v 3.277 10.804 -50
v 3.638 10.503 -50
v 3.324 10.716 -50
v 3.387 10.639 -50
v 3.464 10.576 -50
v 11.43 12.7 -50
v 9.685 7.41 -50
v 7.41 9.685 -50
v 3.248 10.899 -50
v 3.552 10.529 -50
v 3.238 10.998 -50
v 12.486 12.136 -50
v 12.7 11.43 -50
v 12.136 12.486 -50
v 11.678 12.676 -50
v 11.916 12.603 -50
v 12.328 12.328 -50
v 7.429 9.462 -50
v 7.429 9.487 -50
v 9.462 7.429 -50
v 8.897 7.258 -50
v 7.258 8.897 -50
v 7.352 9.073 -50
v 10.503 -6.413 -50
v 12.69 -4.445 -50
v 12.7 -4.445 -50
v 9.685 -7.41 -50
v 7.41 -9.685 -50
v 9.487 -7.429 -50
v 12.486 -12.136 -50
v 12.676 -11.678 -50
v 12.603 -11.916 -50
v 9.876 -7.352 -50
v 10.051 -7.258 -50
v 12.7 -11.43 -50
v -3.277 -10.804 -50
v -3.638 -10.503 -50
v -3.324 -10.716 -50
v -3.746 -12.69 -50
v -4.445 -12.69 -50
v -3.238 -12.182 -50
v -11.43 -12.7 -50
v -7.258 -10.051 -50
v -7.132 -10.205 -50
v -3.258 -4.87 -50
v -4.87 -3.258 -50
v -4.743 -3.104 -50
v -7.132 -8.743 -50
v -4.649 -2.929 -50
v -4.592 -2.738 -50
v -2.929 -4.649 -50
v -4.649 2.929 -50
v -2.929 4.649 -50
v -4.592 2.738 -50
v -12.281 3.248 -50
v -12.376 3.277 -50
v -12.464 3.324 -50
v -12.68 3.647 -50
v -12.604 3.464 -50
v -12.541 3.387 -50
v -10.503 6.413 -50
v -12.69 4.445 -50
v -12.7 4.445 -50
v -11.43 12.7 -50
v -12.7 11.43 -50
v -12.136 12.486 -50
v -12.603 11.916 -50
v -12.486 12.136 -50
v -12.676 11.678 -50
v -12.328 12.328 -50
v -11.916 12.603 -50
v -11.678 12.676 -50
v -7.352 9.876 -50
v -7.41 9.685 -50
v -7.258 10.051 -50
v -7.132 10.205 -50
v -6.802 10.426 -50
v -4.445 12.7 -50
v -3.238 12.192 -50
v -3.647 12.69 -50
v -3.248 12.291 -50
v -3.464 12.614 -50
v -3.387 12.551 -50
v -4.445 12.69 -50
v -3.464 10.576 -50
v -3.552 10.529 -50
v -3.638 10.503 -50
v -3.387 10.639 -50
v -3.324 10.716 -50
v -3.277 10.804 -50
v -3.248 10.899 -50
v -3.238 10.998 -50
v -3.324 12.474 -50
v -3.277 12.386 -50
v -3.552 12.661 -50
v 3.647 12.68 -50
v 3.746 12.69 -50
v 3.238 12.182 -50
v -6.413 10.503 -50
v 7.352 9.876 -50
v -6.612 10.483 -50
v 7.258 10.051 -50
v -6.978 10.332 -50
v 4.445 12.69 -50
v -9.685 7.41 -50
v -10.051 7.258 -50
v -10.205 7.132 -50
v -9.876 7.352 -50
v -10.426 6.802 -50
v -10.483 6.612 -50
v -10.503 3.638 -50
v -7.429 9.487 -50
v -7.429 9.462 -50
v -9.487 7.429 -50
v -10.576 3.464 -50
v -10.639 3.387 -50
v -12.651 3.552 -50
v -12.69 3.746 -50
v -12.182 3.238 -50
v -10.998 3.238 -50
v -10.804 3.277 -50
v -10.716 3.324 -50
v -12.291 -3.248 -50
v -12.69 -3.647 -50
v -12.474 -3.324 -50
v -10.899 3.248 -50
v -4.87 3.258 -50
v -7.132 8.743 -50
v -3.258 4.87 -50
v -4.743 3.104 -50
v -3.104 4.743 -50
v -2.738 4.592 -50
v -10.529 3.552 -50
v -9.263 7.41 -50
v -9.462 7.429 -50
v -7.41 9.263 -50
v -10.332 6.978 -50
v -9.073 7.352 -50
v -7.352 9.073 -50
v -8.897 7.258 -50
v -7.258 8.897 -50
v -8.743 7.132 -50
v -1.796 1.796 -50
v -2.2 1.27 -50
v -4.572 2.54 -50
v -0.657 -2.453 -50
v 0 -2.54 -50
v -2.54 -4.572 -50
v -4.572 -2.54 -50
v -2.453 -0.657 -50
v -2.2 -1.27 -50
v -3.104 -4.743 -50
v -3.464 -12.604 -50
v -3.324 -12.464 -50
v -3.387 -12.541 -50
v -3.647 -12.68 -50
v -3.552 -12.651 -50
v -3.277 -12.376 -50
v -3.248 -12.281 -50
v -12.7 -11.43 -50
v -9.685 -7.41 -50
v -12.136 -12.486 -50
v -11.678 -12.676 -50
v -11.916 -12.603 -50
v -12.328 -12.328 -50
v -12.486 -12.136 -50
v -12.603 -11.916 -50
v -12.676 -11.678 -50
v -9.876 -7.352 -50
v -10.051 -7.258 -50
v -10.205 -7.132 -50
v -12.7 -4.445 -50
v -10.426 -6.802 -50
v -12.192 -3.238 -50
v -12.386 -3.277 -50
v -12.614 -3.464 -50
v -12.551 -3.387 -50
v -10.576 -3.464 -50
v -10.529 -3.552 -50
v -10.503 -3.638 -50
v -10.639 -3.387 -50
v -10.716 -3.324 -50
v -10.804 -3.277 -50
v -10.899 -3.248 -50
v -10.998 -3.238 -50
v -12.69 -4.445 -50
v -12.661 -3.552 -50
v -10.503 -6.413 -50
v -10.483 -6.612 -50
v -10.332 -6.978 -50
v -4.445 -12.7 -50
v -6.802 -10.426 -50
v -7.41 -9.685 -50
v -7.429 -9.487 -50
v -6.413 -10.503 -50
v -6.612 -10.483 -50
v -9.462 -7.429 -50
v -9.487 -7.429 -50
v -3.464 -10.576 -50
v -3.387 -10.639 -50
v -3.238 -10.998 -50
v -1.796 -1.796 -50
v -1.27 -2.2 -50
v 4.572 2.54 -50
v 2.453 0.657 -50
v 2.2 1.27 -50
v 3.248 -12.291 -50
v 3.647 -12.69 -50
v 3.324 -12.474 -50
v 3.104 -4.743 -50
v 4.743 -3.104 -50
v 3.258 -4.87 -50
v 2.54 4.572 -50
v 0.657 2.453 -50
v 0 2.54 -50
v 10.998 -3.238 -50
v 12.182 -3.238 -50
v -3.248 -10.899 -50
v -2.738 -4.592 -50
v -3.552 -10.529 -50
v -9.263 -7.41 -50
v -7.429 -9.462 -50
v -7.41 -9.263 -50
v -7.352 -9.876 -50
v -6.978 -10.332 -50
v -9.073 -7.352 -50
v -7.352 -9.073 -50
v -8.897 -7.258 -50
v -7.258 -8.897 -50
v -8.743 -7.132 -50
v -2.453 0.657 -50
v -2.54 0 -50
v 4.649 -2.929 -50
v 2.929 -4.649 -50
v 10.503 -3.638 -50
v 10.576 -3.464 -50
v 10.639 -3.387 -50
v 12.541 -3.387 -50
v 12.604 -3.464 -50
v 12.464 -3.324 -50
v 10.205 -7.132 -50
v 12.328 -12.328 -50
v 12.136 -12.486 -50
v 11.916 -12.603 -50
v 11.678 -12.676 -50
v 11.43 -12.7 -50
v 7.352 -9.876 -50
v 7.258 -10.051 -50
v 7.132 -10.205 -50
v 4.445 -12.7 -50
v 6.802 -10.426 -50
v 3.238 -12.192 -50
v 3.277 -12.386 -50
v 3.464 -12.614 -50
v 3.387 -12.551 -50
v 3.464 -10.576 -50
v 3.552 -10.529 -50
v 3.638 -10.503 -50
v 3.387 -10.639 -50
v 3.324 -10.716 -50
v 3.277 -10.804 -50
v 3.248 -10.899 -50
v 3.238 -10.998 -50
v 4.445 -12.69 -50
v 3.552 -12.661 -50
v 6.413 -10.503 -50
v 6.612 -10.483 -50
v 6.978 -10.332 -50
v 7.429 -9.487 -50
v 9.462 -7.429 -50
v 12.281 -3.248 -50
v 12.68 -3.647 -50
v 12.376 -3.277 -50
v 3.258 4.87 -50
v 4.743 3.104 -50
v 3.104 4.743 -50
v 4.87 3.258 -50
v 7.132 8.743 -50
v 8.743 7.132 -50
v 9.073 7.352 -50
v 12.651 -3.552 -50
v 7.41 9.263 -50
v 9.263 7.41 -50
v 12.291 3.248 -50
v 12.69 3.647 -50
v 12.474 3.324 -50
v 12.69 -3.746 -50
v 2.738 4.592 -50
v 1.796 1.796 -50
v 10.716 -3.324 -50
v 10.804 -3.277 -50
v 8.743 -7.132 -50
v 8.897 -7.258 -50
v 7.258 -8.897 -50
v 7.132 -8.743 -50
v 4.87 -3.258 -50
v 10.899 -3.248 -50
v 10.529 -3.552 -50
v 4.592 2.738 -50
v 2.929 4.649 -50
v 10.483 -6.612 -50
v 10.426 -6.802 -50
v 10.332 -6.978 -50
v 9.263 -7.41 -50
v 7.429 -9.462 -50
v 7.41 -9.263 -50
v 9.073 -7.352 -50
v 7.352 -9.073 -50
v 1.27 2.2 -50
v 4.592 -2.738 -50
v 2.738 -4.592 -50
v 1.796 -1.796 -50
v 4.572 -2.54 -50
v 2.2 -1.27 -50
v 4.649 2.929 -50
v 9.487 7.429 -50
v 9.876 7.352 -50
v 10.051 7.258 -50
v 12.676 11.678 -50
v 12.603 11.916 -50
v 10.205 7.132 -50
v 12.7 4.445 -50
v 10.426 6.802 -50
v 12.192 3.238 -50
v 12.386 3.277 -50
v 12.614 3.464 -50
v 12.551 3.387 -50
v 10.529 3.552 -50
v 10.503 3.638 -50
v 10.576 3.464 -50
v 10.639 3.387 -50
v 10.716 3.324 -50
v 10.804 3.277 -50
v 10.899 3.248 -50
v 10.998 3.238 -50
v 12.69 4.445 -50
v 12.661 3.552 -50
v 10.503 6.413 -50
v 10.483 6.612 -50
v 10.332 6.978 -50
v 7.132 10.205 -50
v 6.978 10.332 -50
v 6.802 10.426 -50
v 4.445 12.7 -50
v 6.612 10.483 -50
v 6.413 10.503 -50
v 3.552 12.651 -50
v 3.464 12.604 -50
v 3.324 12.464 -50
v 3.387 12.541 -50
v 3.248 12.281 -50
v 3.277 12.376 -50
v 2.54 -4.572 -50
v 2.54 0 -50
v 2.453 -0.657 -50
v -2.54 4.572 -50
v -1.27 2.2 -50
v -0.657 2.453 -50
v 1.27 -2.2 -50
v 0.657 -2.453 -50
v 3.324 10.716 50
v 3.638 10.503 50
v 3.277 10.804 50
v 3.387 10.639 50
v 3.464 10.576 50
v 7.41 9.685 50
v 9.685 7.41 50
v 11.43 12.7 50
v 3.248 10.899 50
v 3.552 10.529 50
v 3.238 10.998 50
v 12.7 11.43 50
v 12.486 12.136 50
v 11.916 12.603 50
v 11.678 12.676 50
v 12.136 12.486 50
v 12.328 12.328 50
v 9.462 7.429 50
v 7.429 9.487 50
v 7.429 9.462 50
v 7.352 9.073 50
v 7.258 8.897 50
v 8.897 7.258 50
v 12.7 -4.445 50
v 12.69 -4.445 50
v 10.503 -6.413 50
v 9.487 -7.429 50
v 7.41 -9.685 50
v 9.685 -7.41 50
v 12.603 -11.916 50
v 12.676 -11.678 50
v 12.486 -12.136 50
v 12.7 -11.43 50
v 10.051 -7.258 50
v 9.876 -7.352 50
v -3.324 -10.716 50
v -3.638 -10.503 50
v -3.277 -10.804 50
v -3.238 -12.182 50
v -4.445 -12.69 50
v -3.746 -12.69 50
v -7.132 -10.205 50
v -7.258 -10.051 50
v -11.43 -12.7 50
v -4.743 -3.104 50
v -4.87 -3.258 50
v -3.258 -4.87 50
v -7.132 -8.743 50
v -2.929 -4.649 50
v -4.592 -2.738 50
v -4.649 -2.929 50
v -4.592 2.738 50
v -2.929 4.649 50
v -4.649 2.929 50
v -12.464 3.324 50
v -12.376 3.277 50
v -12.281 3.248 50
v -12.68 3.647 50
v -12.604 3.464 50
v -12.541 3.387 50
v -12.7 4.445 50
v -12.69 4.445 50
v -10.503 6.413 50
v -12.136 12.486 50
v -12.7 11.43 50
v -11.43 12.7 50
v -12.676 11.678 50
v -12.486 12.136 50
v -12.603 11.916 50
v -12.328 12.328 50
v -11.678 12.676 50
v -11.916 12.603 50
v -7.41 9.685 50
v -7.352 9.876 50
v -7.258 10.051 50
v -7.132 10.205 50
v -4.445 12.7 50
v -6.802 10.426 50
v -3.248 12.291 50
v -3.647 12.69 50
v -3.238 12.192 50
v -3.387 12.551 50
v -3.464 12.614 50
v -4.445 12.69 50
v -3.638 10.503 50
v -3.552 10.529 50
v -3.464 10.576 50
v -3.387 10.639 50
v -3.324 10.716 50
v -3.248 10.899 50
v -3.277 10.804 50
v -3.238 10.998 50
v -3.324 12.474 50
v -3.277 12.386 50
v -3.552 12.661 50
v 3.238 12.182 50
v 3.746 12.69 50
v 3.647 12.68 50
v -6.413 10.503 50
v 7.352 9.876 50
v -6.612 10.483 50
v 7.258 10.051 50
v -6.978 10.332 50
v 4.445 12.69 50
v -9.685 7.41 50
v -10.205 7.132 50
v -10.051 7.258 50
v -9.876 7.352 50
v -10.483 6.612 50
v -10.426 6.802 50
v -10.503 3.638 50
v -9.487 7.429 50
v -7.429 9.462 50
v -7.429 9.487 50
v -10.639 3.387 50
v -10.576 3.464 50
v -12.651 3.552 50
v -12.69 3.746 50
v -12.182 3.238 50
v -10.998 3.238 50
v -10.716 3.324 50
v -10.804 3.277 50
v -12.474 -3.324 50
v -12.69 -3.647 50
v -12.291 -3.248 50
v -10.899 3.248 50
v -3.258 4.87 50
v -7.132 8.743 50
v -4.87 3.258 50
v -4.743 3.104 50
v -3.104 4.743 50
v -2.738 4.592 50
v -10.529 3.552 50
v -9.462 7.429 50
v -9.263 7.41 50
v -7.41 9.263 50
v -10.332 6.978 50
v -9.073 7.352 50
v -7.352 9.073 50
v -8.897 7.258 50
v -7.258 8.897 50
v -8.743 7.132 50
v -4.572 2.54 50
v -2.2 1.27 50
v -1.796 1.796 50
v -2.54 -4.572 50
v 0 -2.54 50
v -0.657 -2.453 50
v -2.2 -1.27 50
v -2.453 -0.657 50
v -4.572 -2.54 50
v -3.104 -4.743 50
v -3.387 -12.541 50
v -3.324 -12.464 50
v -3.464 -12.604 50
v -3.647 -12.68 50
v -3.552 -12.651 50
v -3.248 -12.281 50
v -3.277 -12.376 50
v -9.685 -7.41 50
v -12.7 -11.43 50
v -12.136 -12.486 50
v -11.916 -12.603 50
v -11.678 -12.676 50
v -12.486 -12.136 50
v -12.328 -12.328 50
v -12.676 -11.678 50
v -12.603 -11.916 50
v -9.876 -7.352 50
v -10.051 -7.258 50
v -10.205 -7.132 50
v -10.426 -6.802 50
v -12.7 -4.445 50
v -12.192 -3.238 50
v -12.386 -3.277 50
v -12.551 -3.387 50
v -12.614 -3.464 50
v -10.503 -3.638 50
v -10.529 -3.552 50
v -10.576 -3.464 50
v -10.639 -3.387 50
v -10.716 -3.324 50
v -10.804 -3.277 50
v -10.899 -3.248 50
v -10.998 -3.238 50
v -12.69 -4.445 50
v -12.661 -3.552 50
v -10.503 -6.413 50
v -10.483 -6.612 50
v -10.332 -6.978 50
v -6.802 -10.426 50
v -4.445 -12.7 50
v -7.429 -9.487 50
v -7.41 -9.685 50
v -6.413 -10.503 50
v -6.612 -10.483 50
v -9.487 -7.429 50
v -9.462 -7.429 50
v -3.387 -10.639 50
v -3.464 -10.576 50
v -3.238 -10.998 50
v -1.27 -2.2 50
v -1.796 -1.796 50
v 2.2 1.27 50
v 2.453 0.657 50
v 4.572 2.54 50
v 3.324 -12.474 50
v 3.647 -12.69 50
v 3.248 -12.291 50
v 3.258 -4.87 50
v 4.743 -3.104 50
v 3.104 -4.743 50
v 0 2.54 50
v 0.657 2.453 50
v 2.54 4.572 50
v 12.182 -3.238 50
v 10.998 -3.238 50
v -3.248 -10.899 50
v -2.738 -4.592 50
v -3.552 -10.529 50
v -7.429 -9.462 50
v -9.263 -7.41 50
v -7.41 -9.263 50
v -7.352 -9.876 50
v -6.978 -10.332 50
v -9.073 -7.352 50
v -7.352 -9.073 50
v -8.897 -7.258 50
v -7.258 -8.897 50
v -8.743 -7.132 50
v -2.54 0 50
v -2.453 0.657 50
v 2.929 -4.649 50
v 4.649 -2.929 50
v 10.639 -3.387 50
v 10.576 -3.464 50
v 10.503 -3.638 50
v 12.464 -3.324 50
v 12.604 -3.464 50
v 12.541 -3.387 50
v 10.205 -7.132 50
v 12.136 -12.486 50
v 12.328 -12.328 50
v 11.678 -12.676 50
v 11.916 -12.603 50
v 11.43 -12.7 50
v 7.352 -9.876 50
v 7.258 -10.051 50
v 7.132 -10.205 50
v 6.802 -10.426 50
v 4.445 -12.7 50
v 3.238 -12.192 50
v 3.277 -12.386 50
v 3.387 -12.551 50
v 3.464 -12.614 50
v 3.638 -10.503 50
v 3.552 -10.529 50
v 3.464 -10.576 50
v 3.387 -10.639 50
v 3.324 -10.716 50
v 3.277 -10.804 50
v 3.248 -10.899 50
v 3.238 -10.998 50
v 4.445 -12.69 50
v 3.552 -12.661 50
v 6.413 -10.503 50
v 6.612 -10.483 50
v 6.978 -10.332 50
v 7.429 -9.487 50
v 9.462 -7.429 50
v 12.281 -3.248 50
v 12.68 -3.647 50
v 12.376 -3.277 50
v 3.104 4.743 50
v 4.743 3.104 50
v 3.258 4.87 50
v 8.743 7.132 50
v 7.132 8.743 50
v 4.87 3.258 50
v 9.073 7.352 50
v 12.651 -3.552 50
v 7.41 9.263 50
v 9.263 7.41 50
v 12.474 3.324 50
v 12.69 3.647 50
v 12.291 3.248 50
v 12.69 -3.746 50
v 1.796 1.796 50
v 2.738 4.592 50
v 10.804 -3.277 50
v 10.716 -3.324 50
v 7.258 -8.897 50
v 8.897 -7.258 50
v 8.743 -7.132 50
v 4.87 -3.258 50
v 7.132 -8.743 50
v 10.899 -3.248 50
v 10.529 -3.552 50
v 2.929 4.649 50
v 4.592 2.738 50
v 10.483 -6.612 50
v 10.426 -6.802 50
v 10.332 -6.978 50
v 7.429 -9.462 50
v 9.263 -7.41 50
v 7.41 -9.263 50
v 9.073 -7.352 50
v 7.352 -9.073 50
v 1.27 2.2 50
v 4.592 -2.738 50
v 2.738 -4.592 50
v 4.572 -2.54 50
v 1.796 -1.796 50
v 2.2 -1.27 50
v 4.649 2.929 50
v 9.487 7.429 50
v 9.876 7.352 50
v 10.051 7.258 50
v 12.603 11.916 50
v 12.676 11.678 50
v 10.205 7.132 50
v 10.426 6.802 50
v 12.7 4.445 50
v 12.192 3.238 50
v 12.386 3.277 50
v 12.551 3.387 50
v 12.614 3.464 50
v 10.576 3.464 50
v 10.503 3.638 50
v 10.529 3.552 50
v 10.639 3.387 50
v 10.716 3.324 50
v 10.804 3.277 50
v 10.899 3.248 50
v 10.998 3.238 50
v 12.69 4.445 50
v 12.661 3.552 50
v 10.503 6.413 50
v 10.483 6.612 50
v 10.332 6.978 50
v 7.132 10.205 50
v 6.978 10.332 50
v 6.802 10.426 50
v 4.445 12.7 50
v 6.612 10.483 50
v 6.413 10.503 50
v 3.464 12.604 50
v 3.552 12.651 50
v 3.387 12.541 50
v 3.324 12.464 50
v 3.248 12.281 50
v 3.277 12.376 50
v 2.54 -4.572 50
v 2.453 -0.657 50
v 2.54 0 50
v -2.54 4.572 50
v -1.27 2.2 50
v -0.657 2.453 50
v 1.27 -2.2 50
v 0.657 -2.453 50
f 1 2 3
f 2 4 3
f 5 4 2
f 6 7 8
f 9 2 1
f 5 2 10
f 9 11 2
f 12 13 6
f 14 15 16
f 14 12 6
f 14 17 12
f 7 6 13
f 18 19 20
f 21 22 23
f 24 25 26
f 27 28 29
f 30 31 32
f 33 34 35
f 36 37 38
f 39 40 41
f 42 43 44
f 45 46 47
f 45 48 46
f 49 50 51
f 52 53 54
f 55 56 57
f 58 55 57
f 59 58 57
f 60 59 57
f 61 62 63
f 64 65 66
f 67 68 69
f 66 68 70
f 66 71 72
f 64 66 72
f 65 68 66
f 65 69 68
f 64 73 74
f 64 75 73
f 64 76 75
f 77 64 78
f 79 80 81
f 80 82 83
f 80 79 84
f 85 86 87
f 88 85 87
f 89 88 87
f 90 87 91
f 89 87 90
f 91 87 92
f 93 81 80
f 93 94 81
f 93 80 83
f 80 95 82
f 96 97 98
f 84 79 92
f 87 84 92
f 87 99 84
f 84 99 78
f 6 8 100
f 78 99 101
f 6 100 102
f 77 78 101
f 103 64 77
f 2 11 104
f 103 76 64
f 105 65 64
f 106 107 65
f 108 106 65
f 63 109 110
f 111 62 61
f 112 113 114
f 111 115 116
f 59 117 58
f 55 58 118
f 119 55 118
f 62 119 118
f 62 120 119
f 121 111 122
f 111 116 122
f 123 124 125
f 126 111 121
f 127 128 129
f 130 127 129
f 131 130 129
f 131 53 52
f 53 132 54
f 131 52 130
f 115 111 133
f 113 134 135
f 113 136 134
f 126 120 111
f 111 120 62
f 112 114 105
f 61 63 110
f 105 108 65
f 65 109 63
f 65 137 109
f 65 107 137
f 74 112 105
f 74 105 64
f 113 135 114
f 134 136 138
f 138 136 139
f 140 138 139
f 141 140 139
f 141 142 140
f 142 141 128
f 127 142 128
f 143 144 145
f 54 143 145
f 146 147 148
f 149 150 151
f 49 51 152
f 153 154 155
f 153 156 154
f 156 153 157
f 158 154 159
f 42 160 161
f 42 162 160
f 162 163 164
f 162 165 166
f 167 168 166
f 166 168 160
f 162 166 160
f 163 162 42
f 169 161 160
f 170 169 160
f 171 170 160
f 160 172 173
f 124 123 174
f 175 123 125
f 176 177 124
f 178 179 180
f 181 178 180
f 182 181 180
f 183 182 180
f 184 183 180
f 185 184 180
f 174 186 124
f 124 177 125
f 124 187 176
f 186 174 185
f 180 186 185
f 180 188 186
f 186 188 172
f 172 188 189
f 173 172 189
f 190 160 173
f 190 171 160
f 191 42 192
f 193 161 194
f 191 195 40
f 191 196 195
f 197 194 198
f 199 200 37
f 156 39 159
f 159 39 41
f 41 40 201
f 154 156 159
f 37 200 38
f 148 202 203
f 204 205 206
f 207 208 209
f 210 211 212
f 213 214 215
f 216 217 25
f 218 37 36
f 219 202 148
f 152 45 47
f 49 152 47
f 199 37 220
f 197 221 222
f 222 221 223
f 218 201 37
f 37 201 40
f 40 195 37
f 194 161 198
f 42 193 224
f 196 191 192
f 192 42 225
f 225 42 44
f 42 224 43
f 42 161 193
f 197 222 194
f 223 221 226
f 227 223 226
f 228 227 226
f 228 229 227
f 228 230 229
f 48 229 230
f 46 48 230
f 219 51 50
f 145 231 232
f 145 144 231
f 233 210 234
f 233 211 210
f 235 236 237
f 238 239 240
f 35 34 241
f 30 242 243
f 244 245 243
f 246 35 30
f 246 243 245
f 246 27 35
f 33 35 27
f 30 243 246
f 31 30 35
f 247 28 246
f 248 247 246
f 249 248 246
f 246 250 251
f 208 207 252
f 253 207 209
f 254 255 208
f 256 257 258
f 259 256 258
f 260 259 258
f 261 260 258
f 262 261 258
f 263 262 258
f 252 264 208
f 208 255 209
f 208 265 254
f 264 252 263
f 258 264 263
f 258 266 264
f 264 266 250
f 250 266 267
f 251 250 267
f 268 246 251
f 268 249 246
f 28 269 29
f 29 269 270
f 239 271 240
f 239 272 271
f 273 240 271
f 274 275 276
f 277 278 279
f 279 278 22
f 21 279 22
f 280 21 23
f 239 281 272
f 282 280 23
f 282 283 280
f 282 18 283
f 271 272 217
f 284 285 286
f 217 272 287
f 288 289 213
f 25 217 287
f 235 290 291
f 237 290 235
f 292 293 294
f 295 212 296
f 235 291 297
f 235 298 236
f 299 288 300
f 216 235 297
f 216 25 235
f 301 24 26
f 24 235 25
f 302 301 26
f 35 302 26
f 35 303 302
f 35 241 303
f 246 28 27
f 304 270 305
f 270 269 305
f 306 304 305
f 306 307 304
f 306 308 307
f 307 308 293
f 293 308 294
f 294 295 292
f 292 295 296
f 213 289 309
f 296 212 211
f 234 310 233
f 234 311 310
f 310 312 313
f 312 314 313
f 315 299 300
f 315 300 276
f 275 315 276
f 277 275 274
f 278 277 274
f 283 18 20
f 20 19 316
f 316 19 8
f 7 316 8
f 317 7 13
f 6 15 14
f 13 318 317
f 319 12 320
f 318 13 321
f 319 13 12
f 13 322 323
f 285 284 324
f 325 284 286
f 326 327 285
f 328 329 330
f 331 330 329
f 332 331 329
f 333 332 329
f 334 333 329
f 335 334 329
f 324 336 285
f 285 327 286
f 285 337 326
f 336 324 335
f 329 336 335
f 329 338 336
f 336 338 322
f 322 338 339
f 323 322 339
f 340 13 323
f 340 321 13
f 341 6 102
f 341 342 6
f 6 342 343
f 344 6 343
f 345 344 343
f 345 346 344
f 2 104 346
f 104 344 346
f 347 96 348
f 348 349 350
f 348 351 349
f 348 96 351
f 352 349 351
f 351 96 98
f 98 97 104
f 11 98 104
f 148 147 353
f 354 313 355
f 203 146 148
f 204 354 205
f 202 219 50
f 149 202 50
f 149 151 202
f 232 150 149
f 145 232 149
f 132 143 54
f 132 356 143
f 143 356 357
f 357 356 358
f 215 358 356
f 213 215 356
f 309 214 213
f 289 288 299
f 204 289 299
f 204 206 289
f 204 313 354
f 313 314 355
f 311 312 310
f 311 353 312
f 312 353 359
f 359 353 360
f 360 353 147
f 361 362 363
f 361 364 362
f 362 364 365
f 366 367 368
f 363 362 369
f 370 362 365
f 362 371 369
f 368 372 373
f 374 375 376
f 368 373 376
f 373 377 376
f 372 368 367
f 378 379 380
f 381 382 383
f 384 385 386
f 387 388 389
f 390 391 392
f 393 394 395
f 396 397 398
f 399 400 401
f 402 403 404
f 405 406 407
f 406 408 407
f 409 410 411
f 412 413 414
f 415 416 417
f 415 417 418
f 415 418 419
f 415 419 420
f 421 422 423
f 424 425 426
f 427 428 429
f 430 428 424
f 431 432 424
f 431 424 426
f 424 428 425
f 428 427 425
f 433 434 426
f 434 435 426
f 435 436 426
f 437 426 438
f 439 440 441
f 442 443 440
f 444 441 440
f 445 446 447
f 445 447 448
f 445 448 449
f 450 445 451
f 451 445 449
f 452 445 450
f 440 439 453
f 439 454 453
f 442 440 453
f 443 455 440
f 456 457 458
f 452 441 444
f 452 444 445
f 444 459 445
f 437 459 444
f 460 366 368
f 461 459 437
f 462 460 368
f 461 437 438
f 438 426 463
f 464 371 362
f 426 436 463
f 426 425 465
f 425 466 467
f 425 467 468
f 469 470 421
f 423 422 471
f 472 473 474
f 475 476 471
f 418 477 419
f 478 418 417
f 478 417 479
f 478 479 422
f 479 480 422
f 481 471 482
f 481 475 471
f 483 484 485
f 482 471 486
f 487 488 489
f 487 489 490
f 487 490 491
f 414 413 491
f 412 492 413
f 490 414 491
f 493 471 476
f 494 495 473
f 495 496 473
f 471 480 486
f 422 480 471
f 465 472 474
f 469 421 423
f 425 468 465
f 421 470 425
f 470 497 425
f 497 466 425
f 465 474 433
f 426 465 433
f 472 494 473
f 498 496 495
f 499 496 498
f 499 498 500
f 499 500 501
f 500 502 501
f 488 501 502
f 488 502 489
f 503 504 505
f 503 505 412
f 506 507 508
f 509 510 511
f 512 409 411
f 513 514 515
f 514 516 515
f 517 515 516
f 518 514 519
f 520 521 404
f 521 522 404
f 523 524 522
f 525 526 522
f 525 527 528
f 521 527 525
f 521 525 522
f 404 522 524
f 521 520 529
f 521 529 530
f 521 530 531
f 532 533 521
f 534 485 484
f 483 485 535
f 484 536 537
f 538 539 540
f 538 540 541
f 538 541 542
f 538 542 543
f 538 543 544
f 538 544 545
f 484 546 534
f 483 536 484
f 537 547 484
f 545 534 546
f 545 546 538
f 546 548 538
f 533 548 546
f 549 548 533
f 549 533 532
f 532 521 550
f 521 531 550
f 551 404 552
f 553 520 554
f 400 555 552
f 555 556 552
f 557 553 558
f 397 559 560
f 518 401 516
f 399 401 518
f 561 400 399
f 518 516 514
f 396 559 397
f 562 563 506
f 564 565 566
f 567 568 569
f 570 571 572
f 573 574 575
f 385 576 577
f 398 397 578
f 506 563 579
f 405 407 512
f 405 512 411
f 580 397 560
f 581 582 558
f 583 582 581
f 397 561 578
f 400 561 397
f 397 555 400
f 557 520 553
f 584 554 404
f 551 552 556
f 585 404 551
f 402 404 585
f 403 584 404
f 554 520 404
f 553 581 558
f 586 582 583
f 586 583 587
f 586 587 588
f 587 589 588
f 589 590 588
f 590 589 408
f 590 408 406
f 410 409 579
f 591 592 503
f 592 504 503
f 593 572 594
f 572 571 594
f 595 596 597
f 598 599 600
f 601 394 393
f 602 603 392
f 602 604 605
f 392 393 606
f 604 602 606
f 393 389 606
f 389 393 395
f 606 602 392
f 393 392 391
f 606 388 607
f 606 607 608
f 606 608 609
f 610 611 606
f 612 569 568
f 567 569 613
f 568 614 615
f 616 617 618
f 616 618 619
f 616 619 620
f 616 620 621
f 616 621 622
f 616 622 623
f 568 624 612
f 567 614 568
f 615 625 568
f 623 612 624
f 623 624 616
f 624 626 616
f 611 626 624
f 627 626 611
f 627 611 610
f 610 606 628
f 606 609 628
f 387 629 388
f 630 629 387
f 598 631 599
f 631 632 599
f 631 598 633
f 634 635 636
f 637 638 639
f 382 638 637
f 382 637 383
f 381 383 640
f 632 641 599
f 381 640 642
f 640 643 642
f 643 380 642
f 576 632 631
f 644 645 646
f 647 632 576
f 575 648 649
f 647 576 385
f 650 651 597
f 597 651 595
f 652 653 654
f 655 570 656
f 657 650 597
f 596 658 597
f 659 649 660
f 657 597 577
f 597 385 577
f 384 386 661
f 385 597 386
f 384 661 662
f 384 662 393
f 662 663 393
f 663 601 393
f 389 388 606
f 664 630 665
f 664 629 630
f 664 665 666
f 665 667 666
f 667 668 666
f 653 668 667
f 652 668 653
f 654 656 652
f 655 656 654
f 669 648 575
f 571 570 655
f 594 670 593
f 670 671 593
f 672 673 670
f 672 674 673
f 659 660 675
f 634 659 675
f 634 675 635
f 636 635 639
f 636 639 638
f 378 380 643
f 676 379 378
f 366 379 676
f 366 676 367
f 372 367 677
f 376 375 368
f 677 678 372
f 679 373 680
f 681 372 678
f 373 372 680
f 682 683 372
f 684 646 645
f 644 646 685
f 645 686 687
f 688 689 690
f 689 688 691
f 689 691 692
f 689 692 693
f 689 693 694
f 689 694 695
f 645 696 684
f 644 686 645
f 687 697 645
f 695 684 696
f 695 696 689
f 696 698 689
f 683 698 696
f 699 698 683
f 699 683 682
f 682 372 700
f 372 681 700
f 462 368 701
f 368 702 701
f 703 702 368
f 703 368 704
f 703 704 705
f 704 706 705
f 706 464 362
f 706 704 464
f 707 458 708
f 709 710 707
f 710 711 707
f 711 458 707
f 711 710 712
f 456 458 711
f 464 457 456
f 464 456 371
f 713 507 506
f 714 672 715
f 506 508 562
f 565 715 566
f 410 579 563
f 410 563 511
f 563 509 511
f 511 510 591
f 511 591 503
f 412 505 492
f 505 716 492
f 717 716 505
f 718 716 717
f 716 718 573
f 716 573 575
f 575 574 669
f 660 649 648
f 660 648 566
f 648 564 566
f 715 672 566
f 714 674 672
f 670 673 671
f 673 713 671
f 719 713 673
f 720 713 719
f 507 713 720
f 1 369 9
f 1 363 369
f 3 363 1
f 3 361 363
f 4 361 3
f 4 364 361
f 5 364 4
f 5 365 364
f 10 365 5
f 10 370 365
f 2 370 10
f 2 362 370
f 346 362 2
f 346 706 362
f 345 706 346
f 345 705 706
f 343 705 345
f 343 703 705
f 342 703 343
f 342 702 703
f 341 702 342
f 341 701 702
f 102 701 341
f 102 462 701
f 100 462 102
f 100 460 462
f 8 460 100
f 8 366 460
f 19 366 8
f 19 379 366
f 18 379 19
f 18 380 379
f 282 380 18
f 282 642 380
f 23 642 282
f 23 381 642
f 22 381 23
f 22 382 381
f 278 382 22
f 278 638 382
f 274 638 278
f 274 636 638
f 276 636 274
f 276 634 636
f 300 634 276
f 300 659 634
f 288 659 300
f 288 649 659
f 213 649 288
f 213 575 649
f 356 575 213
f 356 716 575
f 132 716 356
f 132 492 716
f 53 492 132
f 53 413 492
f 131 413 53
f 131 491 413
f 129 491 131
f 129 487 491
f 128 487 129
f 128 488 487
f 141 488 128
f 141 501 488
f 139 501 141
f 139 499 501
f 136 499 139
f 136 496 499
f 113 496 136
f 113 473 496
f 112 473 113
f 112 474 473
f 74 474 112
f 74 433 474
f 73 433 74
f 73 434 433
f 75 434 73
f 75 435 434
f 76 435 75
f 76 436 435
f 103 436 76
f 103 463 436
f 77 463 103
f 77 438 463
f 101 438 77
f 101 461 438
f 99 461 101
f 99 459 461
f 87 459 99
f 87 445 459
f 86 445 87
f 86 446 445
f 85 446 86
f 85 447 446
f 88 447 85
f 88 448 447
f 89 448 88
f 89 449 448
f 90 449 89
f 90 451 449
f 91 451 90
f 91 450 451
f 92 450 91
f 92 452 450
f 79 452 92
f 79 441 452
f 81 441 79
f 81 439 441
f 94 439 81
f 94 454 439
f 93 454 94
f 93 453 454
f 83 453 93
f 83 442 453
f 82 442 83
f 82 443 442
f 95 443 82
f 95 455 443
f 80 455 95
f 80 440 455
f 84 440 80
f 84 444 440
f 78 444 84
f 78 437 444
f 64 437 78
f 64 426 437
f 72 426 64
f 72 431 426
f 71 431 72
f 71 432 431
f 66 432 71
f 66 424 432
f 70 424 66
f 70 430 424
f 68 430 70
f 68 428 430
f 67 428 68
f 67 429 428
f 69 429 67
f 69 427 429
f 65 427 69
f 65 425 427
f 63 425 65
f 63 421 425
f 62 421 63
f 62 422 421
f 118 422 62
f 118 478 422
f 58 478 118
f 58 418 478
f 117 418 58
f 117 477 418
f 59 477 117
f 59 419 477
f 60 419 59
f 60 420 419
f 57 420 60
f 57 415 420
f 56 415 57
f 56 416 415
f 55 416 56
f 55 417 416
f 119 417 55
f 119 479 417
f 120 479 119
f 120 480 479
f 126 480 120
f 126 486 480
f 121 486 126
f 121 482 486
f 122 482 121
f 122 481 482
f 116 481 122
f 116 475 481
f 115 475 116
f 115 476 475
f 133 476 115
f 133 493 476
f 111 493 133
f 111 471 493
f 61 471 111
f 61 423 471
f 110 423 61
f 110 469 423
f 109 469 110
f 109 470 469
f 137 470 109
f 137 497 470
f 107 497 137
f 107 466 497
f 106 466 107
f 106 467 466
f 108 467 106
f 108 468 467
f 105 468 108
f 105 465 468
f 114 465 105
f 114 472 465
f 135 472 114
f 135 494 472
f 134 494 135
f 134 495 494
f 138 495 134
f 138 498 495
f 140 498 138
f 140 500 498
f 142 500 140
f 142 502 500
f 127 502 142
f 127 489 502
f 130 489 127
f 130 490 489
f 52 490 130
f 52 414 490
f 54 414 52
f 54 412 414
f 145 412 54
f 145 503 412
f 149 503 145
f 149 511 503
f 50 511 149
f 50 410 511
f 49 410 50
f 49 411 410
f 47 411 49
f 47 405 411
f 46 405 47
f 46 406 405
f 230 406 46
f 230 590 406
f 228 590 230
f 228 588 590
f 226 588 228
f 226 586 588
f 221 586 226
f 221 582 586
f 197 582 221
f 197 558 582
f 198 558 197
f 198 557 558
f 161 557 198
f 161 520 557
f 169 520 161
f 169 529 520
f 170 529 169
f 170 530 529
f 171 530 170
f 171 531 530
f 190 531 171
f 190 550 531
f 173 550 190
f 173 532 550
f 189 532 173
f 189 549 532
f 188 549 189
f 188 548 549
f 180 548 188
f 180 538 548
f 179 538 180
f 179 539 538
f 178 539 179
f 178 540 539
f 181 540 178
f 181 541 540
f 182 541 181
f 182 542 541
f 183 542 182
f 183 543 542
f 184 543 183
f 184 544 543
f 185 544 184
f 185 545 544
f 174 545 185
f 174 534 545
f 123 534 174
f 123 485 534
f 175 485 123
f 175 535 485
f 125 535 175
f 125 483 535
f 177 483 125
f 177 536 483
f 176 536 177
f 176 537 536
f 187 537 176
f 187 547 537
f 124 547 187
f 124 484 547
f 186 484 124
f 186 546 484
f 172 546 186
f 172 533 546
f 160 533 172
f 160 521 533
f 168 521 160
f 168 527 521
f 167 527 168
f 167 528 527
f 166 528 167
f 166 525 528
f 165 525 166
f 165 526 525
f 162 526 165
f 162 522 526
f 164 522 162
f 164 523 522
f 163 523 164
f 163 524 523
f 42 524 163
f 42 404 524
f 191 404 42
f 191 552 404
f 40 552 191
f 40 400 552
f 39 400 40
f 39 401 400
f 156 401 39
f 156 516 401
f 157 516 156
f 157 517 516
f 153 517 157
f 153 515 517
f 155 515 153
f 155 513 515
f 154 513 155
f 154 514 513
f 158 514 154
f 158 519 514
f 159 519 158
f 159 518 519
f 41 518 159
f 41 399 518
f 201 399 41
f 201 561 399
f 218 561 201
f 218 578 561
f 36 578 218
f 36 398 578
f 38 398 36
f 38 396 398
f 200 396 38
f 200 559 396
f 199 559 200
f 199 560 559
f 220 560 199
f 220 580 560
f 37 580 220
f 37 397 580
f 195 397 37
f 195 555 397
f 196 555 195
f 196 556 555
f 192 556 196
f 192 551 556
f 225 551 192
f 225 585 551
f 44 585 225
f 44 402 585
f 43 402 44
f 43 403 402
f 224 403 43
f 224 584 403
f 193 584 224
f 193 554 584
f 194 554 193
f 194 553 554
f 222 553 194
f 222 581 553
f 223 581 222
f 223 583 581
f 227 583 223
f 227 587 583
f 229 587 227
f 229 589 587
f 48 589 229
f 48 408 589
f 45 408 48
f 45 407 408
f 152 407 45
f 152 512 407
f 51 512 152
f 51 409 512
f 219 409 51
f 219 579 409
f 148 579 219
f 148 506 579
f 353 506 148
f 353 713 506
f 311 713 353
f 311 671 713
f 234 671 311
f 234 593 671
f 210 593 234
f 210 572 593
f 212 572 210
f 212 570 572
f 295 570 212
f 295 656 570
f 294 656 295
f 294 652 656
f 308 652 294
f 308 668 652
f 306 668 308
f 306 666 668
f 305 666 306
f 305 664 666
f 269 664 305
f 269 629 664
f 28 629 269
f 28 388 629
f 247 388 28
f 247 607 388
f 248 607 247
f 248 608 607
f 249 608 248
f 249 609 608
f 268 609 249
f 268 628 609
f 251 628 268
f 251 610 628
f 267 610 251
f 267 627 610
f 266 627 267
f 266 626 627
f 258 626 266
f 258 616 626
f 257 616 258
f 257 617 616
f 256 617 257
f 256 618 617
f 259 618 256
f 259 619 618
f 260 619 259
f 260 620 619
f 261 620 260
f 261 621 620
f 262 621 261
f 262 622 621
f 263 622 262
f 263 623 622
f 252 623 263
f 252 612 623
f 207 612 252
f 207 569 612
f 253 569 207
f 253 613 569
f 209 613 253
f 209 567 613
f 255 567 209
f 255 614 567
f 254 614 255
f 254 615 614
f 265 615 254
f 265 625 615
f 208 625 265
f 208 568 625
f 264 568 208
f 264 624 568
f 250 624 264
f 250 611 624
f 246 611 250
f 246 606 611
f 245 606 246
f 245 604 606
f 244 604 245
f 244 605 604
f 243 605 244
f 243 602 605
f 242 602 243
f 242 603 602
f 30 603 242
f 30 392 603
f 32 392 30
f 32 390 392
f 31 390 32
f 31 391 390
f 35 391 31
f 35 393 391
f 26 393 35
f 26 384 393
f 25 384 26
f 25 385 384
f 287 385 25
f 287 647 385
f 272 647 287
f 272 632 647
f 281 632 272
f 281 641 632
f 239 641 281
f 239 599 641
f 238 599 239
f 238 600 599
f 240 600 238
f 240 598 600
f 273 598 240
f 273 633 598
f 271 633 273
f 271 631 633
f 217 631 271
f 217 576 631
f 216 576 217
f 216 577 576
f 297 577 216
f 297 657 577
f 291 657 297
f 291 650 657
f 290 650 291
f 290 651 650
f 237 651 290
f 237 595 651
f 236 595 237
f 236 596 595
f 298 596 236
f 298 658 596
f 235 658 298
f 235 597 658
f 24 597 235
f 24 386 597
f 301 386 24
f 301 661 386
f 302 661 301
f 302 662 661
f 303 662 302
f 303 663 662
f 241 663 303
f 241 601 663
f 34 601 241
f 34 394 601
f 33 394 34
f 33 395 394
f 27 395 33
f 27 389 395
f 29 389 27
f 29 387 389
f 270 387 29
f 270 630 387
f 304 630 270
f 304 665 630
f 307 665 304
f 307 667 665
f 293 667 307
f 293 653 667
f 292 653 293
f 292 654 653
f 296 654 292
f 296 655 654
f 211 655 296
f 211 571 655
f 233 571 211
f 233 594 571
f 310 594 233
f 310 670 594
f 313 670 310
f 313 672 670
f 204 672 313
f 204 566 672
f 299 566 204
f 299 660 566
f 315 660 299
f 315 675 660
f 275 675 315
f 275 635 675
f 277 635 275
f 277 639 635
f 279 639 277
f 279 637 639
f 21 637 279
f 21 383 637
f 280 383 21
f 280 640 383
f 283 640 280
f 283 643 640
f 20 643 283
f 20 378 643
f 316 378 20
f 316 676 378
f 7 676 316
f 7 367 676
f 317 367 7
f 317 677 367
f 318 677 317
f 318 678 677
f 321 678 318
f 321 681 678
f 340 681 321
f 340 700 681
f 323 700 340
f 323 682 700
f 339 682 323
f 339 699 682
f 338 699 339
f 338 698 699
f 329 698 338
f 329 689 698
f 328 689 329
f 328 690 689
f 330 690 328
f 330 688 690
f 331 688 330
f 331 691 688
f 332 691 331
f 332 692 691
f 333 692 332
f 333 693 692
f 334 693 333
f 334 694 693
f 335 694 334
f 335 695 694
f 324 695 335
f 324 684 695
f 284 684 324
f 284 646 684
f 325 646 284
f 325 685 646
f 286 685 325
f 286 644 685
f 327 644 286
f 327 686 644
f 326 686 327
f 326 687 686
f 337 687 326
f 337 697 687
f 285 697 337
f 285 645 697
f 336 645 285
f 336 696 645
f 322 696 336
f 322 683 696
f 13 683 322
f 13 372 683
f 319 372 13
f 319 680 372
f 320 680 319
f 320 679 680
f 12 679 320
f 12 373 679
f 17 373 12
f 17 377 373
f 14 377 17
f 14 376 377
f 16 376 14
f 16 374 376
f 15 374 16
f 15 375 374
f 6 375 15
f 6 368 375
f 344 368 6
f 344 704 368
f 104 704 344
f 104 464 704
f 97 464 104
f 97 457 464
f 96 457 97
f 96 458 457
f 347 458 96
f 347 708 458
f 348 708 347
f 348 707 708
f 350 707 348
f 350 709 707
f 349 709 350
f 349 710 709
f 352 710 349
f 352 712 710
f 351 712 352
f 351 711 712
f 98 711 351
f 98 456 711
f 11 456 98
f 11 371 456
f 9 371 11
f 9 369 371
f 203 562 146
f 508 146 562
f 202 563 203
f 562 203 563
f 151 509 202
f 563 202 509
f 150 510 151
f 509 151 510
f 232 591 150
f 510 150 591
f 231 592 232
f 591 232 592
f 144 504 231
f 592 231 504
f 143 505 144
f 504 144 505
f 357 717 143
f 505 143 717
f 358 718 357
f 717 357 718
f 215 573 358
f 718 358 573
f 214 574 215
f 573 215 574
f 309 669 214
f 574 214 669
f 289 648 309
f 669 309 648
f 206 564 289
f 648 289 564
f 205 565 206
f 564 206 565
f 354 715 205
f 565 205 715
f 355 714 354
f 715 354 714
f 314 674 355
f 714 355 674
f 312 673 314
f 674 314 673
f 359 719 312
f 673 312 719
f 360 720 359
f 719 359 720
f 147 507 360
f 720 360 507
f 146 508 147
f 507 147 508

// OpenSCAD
/*
*   Generic library for fractional t-slot extrusions.
*   Rev. 1
*
*  Creative Commons Share Alike 3.0
*  Copyright (c) 2013 David Lee Miller
* 
*/

minkR_TS = 0.04*25.4;   // minkowski radius for the t-slot
minkR_IC = 0.075*25.4;   // minkowski radius for the inner cutout
minkR_PF = 0.05*25.4;   // minkowski radius for the profile corners

1010Profile(100);
//1020Profile(100);
//1030Profile(100);
//2020Profile(100);
//2040Profile(100);


module fillet(rad){
	translate([-rad,-rad,0])
	difference(){
		//translate([0,0,0]) square([rad+0.01,rad+0.01]);
                translate([0,0,0]) square([rad,rad]);
		circle(r=rad,center=true,$fn=32);
	}
}

module insideCutout(){
	minkowski(){
		translate([0,0,0]) circle(r=minkR_IC,center=true,$fn=32);
		hull(){
			square([0.2*25.4-minkR_IC,0.645*25.4-2*minkR_IC],center=true);
			square([0.8*25.4-2*minkR_IC,0.001*25.4],center=true);
		}
	}
}

module doubleCutout(){
	union(){
		minkowski(){
			translate([0,0,0]) circle(r=minkR_IC,center=true,$fn=32);
			union(){
			rotate([0,0,0]) hull(){
				translate([-0.5*25.4,0,0]) hull(){
					square([0.2*25.4-minkR_IC,0.645*25.4-2*minkR_IC],center=true);
					square([0.8*25.4-2*minkR_IC,0.001*25.4],center=true);
				}
				translate([0.5*25.4,0,0]) hull(){
					square([0.2*25.4-minkR_IC,0.645*25.4-2*minkR_IC],center=true);
					square([0.8*25.4-2*minkR_IC,0.001*25.4],center=true);
				}
			}
			rotate([0,0,90]) hull(){
				translate([-0.5*25.4,0,0]) hull(){
					square([0.2*25.4-minkR_IC,0.645*25.4-2*minkR_IC],center=true);
					square([0.8*25.4-2*minkR_IC,0.001*25.4],center=true);
				}
				translate([0.5*25.4,0,0]) hull(){
					square([0.2*25.4-minkR_IC,0.645*25.4-2*minkR_IC],center=true);
					square([0.8*25.4-2*minkR_IC,0.001*25.4],center=true);
				}
			}}
		}
		rotate([0,0,0]) translate([-0.645*25.4/2,-0.645*25.4/2,0]) fillet(minkR_IC);
		rotate([0,0,180]) translate([-0.645*25.4/2,-0.645*25.4/2,0]) fillet(minkR_IC);
		rotate([0,0,90]) translate([-0.645*25.4/2,-0.645*25.4/2,0]) fillet(minkR_IC);
		rotate([0,0,-90]) translate([-0.645*25.4/2,-0.645*25.4/2,0]) fillet(minkR_IC);
	}
}

module tSlot(){
	union(){
		translate([minkR_TS,0,0])
		minkowski(){
			translate([0,0,0]) circle(r=minkR_TS,center=true,$fn=32);
			hull(){
				square([0.001*25.4,0.585*25.4-2*minkR_TS],center=true);
				translate([(0.233*25.4-2*minkR_TS)/2,0,0]) square([0.233*25.4-2*minkR_TS,0.2*25.4],center=true);
			}
		}
	translate([-0.255*25.4/2+0.01,0,0]) square(0.255*25.4,center=true);
	translate([-0.35*25.4/2-0.087*25.4+0.01,0,0]) square(0.35*25.4,center=true);
	translate([0,-0.255*25.4/2,0]) fillet(minkR_TS/2);
	translate([-0.087*25.4,-.255*25.4/2,0]) rotate([0,0,90]) fillet(minkR_TS/2);
	scale([1,-1,1]) translate([0,-0.255*25.4/2,0]) fillet(minkR_TS/2);
	//scale([1,-1,1]) translate([-0.087*25.4,-.255*25.4/2,0]) rotate([0,0,90]) fillet(minkR_TS/2);
        scale([1,-1,1]) translate([-0.087*25.4+0.01,-.255*25.4/2,0]) rotate([0,0,90]) fillet(minkR_TS/2);
	}
}

module 1010Profile(height){
	linear_extrude(height=height,center=true)
	union(){
	difference(){
		minkowski(){
			translate([0,0,0]) circle(r=minkR_PF,center=true,$fn=32);
			square([1*25.4-2*minkR_PF,1*25.4-2*minkR_PF],center=true);
		}
		translate([0,0,0]) circle(r=0.2*25.4/2,$fn=24);
		translate([-0.5*25.4+0.087*25.4,0,0]) tSlot();
		rotate([0,0,180]) translate([-0.5*25.4+0.087*25.4,0,0]) tSlot();
		translate([0,-0.5*25.4+0.087*25.4,0]) rotate([0,0,90]) tSlot();
		translate([0,0.5*25.4-0.087*25.4,0]) rotate([0,0,-90]) tSlot();
	}}
}

module 1020Profile(height){
	linear_extrude(height=height,center=true)
	difference(){
		minkowski(){
			translate([0,0,0]) circle(r=minkR_PF,center=true,$fn=32);
			square([1*25.4-2*minkR_PF,2*25.4-2*minkR_PF],center=true);
		}
		translate([0,0.5*25.4,0]) circle(r=0.2*25.4/2,$fn=24);
		translate([0,-0.5*25.4,0]) circle(r=0.2*25.4/2,$fn=24);
		translate([0,0,0]) insideCutout();
		translate([-0.5*25.4+0.087*25.4,0.5*25.4,0]) tSlot();
		rotate([0,0,180]) translate([-0.5*25.4+0.087*25.4,0.5*25.4,0]) tSlot();
		translate([-0.5*25.4+0.087*25.4,-0.5*25.4,0]) tSlot();
		rotate([0,0,180]) translate([-0.5*25.4+0.087*25.4,-0.5*25.4,0]) tSlot();
		translate([0,-1*25.4+0.087*25.4,0]) rotate([0,0,90]) tSlot();
		translate([0,1*25.4-0.087*25.4,0]) rotate([0,0,-90]) tSlot();
	}
}

module 1030Profile(height){
	linear_extrude(height=height,center=true)
	difference(){
		minkowski(){
			translate([0,0,0]) circle(r=minkR_PF,center=true,$fn=32);
			square([1*25.4-2*minkR_PF,3*25.4-2*minkR_PF],center=true);
		}
		translate([0,0,0]) circle(r=0.2*25.4/2,$fn=24);
		translate([0,1*25.4,0]) circle(r=0.2*25.4/2,$fn=24);
		translate([0,-1*25.4,0]) circle(r=0.2*25.4/2,$fn=24);
		translate([0,-0.5*25.4,0]) insideCutout();
		translate([0,0.5*25.4,0]) insideCutout();
		translate([-0.5*25.4+0.087*25.4,0,0]) tSlot();
		rotate([0,0,180]) translate([-0.5*25.4+0.087*25.4,0,0]) tSlot();
		translate([-0.5*25.4+0.087*25.4,1*25.4,0]) tSlot();
		rotate([0,0,180]) translate([-0.5*25.4+0.087*25.4,1*25.4,0]) tSlot();
		translate([-0.5*25.4+0.087*25.4,-1*25.4,0]) tSlot();
		rotate([0,0,180]) translate([-0.5*25.4+0.087*25.4,-1*25.4,0]) tSlot();
		translate([0,-1.5*25.4+0.087*25.4,0]) rotate([0,0,90]) tSlot();
		translate([0,1.5*25.4-0.087*25.4,0]) rotate([0,0,-90]) tSlot();
	}
}

module 2020Profile(height){
	linear_extrude(height=height,center=true)
	difference(){
		minkowski(){
			translate([0,0,0]) circle(r=minkR_PF,center=true,$fn=32);
			square([2*25.4-2*minkR_PF,2*25.4-2*minkR_PF],center=true);
		}
		translate([0.5*25.4,0.5*25.4,0]) circle(r=0.2*25.4/2,$fn=24);
		translate([-0.5*25.4,0.5*25.4,0]) circle(r=0.2*25.4/2,$fn=24);
		translate([0.5*25.4,-0.5*25.4,0]) circle(r=0.2*25.4/2,$fn=24);
		translate([-0.5*25.4,-0.5*25.4,0]) circle(r=0.2*25.4/2,$fn=24);
		translate([0,0,0]) doubleCutout();
		translate([-1*25.4+0.087*25.4,0.5*25.4,0]) tSlot();
		rotate([0,0,180]) translate([-1*25.4+0.087*25.4,0.5*25.4,0]) tSlot();
		translate([-1*25.4+0.087*25.4,-0.5*25.4,0]) tSlot();
		rotate([0,0,180]) translate([-1*25.4+0.087*25.4,-0.5*25.4,0]) tSlot();
		translate([-0.5*25.4,1*25.4-0.087*25.4,0]) rotate([0,0,-90]) tSlot();
		rotate([0,0,180]) translate([-0.5*25.4,1*25.4-0.087*25.4,0]) rotate([0,0,-90]) tSlot();
		translate([0.5*25.4,1*25.4-0.087*25.4,0]) rotate([0,0,-90]) tSlot();
		rotate([0,0,180]) translate([0.5*25.4,1*25.4-0.087*25.4,0]) rotate([0,0,-90]) tSlot();
	}
}

module 2040Profile(height){
	linear_extrude(height=height,center=true)
	difference(){
		minkowski(){
			translate([0,0,0]) circle(r=minkR_PF,center=true,$fn=32);
			square([2*25.4-2*minkR_PF,4*25.4-2*minkR_PF],center=true);
		}
		translate([0.5*25.4,1.5*25.4,0]) circle(r=0.2*25.4/2,$fn=24);
		translate([-0.5*25.4,1.5*25.4,0]) circle(r=0.2*25.4/2,$fn=24);
		translate([0.5*25.4,0.5*25.4,0]) circle(r=0.2*25.4/2,$fn=24);
		translate([-0.5*25.4,0.5*25.4,0]) circle(r=0.2*25.4/2,$fn=24);
		translate([0.5*25.4,-1.5*25.4,0]) circle(r=0.2*25.4/2,$fn=24);
		translate([-0.5*25.4,-1.5*25.4,0]) circle(r=0.2*25.4/2,$fn=24);
		translate([0.5*25.4,-0.5*25.4,0]) circle(r=0.2*25.4/2,$fn=24);
		translate([-0.5*25.4,-0.5*25.4,0]) circle(r=0.2*25.4/2,$fn=24);
		translate([0,1*25.4,0]) doubleCutout();
		translate([0,-1*25.4,0]) doubleCutout();
		translate([0.5*25.4,0,0]) insideCutout();
		translate([-0.5*25.4,0,0]) insideCutout();
		translate([-1*25.4+0.087*25.4,0.5*25.4,0]) tSlot();
		rotate([0,0,180]) translate([-1*25.4+0.087*25.4,0.5*25.4,0]) tSlot();
		translate([-1*25.4+0.087*25.4,-0.5*25.4,0]) tSlot();
		rotate([0,0,180]) translate([-1*25.4+0.087*25.4,-0.5*25.4,0]) tSlot();
		translate([-1*25.4+0.087*25.4,1.5*25.4,0]) tSlot();
		rotate([0,0,180]) translate([-1*25.4+0.087*25.4,1.5*25.4,0]) tSlot();
		translate([-1*25.4+0.087*25.4,-1.5*25.4,0]) tSlot();
		rotate([0,0,180]) translate([-1*25.4+0.087*25.4,-1.5*25.4,0]) tSlot();
		translate([-0.5*25.4,2*25.4-0.087*25.4,0]) rotate([0,0,-90]) tSlot();
		rotate([0,0,180]) translate([-0.5*25.4,2*25.4-0.087*25.4,0]) rotate([0,0,-90]) tSlot();
		translate([0.5*25.4,2*25.4-0.087*25.4,0]) rotate([0,0,-90]) tSlot();
		rotate([0,0,180]) translate([0.5*25.4,2*25.4-0.087*25.4,0]) rotate([0,0,-90]) tSlot();
	}
}
